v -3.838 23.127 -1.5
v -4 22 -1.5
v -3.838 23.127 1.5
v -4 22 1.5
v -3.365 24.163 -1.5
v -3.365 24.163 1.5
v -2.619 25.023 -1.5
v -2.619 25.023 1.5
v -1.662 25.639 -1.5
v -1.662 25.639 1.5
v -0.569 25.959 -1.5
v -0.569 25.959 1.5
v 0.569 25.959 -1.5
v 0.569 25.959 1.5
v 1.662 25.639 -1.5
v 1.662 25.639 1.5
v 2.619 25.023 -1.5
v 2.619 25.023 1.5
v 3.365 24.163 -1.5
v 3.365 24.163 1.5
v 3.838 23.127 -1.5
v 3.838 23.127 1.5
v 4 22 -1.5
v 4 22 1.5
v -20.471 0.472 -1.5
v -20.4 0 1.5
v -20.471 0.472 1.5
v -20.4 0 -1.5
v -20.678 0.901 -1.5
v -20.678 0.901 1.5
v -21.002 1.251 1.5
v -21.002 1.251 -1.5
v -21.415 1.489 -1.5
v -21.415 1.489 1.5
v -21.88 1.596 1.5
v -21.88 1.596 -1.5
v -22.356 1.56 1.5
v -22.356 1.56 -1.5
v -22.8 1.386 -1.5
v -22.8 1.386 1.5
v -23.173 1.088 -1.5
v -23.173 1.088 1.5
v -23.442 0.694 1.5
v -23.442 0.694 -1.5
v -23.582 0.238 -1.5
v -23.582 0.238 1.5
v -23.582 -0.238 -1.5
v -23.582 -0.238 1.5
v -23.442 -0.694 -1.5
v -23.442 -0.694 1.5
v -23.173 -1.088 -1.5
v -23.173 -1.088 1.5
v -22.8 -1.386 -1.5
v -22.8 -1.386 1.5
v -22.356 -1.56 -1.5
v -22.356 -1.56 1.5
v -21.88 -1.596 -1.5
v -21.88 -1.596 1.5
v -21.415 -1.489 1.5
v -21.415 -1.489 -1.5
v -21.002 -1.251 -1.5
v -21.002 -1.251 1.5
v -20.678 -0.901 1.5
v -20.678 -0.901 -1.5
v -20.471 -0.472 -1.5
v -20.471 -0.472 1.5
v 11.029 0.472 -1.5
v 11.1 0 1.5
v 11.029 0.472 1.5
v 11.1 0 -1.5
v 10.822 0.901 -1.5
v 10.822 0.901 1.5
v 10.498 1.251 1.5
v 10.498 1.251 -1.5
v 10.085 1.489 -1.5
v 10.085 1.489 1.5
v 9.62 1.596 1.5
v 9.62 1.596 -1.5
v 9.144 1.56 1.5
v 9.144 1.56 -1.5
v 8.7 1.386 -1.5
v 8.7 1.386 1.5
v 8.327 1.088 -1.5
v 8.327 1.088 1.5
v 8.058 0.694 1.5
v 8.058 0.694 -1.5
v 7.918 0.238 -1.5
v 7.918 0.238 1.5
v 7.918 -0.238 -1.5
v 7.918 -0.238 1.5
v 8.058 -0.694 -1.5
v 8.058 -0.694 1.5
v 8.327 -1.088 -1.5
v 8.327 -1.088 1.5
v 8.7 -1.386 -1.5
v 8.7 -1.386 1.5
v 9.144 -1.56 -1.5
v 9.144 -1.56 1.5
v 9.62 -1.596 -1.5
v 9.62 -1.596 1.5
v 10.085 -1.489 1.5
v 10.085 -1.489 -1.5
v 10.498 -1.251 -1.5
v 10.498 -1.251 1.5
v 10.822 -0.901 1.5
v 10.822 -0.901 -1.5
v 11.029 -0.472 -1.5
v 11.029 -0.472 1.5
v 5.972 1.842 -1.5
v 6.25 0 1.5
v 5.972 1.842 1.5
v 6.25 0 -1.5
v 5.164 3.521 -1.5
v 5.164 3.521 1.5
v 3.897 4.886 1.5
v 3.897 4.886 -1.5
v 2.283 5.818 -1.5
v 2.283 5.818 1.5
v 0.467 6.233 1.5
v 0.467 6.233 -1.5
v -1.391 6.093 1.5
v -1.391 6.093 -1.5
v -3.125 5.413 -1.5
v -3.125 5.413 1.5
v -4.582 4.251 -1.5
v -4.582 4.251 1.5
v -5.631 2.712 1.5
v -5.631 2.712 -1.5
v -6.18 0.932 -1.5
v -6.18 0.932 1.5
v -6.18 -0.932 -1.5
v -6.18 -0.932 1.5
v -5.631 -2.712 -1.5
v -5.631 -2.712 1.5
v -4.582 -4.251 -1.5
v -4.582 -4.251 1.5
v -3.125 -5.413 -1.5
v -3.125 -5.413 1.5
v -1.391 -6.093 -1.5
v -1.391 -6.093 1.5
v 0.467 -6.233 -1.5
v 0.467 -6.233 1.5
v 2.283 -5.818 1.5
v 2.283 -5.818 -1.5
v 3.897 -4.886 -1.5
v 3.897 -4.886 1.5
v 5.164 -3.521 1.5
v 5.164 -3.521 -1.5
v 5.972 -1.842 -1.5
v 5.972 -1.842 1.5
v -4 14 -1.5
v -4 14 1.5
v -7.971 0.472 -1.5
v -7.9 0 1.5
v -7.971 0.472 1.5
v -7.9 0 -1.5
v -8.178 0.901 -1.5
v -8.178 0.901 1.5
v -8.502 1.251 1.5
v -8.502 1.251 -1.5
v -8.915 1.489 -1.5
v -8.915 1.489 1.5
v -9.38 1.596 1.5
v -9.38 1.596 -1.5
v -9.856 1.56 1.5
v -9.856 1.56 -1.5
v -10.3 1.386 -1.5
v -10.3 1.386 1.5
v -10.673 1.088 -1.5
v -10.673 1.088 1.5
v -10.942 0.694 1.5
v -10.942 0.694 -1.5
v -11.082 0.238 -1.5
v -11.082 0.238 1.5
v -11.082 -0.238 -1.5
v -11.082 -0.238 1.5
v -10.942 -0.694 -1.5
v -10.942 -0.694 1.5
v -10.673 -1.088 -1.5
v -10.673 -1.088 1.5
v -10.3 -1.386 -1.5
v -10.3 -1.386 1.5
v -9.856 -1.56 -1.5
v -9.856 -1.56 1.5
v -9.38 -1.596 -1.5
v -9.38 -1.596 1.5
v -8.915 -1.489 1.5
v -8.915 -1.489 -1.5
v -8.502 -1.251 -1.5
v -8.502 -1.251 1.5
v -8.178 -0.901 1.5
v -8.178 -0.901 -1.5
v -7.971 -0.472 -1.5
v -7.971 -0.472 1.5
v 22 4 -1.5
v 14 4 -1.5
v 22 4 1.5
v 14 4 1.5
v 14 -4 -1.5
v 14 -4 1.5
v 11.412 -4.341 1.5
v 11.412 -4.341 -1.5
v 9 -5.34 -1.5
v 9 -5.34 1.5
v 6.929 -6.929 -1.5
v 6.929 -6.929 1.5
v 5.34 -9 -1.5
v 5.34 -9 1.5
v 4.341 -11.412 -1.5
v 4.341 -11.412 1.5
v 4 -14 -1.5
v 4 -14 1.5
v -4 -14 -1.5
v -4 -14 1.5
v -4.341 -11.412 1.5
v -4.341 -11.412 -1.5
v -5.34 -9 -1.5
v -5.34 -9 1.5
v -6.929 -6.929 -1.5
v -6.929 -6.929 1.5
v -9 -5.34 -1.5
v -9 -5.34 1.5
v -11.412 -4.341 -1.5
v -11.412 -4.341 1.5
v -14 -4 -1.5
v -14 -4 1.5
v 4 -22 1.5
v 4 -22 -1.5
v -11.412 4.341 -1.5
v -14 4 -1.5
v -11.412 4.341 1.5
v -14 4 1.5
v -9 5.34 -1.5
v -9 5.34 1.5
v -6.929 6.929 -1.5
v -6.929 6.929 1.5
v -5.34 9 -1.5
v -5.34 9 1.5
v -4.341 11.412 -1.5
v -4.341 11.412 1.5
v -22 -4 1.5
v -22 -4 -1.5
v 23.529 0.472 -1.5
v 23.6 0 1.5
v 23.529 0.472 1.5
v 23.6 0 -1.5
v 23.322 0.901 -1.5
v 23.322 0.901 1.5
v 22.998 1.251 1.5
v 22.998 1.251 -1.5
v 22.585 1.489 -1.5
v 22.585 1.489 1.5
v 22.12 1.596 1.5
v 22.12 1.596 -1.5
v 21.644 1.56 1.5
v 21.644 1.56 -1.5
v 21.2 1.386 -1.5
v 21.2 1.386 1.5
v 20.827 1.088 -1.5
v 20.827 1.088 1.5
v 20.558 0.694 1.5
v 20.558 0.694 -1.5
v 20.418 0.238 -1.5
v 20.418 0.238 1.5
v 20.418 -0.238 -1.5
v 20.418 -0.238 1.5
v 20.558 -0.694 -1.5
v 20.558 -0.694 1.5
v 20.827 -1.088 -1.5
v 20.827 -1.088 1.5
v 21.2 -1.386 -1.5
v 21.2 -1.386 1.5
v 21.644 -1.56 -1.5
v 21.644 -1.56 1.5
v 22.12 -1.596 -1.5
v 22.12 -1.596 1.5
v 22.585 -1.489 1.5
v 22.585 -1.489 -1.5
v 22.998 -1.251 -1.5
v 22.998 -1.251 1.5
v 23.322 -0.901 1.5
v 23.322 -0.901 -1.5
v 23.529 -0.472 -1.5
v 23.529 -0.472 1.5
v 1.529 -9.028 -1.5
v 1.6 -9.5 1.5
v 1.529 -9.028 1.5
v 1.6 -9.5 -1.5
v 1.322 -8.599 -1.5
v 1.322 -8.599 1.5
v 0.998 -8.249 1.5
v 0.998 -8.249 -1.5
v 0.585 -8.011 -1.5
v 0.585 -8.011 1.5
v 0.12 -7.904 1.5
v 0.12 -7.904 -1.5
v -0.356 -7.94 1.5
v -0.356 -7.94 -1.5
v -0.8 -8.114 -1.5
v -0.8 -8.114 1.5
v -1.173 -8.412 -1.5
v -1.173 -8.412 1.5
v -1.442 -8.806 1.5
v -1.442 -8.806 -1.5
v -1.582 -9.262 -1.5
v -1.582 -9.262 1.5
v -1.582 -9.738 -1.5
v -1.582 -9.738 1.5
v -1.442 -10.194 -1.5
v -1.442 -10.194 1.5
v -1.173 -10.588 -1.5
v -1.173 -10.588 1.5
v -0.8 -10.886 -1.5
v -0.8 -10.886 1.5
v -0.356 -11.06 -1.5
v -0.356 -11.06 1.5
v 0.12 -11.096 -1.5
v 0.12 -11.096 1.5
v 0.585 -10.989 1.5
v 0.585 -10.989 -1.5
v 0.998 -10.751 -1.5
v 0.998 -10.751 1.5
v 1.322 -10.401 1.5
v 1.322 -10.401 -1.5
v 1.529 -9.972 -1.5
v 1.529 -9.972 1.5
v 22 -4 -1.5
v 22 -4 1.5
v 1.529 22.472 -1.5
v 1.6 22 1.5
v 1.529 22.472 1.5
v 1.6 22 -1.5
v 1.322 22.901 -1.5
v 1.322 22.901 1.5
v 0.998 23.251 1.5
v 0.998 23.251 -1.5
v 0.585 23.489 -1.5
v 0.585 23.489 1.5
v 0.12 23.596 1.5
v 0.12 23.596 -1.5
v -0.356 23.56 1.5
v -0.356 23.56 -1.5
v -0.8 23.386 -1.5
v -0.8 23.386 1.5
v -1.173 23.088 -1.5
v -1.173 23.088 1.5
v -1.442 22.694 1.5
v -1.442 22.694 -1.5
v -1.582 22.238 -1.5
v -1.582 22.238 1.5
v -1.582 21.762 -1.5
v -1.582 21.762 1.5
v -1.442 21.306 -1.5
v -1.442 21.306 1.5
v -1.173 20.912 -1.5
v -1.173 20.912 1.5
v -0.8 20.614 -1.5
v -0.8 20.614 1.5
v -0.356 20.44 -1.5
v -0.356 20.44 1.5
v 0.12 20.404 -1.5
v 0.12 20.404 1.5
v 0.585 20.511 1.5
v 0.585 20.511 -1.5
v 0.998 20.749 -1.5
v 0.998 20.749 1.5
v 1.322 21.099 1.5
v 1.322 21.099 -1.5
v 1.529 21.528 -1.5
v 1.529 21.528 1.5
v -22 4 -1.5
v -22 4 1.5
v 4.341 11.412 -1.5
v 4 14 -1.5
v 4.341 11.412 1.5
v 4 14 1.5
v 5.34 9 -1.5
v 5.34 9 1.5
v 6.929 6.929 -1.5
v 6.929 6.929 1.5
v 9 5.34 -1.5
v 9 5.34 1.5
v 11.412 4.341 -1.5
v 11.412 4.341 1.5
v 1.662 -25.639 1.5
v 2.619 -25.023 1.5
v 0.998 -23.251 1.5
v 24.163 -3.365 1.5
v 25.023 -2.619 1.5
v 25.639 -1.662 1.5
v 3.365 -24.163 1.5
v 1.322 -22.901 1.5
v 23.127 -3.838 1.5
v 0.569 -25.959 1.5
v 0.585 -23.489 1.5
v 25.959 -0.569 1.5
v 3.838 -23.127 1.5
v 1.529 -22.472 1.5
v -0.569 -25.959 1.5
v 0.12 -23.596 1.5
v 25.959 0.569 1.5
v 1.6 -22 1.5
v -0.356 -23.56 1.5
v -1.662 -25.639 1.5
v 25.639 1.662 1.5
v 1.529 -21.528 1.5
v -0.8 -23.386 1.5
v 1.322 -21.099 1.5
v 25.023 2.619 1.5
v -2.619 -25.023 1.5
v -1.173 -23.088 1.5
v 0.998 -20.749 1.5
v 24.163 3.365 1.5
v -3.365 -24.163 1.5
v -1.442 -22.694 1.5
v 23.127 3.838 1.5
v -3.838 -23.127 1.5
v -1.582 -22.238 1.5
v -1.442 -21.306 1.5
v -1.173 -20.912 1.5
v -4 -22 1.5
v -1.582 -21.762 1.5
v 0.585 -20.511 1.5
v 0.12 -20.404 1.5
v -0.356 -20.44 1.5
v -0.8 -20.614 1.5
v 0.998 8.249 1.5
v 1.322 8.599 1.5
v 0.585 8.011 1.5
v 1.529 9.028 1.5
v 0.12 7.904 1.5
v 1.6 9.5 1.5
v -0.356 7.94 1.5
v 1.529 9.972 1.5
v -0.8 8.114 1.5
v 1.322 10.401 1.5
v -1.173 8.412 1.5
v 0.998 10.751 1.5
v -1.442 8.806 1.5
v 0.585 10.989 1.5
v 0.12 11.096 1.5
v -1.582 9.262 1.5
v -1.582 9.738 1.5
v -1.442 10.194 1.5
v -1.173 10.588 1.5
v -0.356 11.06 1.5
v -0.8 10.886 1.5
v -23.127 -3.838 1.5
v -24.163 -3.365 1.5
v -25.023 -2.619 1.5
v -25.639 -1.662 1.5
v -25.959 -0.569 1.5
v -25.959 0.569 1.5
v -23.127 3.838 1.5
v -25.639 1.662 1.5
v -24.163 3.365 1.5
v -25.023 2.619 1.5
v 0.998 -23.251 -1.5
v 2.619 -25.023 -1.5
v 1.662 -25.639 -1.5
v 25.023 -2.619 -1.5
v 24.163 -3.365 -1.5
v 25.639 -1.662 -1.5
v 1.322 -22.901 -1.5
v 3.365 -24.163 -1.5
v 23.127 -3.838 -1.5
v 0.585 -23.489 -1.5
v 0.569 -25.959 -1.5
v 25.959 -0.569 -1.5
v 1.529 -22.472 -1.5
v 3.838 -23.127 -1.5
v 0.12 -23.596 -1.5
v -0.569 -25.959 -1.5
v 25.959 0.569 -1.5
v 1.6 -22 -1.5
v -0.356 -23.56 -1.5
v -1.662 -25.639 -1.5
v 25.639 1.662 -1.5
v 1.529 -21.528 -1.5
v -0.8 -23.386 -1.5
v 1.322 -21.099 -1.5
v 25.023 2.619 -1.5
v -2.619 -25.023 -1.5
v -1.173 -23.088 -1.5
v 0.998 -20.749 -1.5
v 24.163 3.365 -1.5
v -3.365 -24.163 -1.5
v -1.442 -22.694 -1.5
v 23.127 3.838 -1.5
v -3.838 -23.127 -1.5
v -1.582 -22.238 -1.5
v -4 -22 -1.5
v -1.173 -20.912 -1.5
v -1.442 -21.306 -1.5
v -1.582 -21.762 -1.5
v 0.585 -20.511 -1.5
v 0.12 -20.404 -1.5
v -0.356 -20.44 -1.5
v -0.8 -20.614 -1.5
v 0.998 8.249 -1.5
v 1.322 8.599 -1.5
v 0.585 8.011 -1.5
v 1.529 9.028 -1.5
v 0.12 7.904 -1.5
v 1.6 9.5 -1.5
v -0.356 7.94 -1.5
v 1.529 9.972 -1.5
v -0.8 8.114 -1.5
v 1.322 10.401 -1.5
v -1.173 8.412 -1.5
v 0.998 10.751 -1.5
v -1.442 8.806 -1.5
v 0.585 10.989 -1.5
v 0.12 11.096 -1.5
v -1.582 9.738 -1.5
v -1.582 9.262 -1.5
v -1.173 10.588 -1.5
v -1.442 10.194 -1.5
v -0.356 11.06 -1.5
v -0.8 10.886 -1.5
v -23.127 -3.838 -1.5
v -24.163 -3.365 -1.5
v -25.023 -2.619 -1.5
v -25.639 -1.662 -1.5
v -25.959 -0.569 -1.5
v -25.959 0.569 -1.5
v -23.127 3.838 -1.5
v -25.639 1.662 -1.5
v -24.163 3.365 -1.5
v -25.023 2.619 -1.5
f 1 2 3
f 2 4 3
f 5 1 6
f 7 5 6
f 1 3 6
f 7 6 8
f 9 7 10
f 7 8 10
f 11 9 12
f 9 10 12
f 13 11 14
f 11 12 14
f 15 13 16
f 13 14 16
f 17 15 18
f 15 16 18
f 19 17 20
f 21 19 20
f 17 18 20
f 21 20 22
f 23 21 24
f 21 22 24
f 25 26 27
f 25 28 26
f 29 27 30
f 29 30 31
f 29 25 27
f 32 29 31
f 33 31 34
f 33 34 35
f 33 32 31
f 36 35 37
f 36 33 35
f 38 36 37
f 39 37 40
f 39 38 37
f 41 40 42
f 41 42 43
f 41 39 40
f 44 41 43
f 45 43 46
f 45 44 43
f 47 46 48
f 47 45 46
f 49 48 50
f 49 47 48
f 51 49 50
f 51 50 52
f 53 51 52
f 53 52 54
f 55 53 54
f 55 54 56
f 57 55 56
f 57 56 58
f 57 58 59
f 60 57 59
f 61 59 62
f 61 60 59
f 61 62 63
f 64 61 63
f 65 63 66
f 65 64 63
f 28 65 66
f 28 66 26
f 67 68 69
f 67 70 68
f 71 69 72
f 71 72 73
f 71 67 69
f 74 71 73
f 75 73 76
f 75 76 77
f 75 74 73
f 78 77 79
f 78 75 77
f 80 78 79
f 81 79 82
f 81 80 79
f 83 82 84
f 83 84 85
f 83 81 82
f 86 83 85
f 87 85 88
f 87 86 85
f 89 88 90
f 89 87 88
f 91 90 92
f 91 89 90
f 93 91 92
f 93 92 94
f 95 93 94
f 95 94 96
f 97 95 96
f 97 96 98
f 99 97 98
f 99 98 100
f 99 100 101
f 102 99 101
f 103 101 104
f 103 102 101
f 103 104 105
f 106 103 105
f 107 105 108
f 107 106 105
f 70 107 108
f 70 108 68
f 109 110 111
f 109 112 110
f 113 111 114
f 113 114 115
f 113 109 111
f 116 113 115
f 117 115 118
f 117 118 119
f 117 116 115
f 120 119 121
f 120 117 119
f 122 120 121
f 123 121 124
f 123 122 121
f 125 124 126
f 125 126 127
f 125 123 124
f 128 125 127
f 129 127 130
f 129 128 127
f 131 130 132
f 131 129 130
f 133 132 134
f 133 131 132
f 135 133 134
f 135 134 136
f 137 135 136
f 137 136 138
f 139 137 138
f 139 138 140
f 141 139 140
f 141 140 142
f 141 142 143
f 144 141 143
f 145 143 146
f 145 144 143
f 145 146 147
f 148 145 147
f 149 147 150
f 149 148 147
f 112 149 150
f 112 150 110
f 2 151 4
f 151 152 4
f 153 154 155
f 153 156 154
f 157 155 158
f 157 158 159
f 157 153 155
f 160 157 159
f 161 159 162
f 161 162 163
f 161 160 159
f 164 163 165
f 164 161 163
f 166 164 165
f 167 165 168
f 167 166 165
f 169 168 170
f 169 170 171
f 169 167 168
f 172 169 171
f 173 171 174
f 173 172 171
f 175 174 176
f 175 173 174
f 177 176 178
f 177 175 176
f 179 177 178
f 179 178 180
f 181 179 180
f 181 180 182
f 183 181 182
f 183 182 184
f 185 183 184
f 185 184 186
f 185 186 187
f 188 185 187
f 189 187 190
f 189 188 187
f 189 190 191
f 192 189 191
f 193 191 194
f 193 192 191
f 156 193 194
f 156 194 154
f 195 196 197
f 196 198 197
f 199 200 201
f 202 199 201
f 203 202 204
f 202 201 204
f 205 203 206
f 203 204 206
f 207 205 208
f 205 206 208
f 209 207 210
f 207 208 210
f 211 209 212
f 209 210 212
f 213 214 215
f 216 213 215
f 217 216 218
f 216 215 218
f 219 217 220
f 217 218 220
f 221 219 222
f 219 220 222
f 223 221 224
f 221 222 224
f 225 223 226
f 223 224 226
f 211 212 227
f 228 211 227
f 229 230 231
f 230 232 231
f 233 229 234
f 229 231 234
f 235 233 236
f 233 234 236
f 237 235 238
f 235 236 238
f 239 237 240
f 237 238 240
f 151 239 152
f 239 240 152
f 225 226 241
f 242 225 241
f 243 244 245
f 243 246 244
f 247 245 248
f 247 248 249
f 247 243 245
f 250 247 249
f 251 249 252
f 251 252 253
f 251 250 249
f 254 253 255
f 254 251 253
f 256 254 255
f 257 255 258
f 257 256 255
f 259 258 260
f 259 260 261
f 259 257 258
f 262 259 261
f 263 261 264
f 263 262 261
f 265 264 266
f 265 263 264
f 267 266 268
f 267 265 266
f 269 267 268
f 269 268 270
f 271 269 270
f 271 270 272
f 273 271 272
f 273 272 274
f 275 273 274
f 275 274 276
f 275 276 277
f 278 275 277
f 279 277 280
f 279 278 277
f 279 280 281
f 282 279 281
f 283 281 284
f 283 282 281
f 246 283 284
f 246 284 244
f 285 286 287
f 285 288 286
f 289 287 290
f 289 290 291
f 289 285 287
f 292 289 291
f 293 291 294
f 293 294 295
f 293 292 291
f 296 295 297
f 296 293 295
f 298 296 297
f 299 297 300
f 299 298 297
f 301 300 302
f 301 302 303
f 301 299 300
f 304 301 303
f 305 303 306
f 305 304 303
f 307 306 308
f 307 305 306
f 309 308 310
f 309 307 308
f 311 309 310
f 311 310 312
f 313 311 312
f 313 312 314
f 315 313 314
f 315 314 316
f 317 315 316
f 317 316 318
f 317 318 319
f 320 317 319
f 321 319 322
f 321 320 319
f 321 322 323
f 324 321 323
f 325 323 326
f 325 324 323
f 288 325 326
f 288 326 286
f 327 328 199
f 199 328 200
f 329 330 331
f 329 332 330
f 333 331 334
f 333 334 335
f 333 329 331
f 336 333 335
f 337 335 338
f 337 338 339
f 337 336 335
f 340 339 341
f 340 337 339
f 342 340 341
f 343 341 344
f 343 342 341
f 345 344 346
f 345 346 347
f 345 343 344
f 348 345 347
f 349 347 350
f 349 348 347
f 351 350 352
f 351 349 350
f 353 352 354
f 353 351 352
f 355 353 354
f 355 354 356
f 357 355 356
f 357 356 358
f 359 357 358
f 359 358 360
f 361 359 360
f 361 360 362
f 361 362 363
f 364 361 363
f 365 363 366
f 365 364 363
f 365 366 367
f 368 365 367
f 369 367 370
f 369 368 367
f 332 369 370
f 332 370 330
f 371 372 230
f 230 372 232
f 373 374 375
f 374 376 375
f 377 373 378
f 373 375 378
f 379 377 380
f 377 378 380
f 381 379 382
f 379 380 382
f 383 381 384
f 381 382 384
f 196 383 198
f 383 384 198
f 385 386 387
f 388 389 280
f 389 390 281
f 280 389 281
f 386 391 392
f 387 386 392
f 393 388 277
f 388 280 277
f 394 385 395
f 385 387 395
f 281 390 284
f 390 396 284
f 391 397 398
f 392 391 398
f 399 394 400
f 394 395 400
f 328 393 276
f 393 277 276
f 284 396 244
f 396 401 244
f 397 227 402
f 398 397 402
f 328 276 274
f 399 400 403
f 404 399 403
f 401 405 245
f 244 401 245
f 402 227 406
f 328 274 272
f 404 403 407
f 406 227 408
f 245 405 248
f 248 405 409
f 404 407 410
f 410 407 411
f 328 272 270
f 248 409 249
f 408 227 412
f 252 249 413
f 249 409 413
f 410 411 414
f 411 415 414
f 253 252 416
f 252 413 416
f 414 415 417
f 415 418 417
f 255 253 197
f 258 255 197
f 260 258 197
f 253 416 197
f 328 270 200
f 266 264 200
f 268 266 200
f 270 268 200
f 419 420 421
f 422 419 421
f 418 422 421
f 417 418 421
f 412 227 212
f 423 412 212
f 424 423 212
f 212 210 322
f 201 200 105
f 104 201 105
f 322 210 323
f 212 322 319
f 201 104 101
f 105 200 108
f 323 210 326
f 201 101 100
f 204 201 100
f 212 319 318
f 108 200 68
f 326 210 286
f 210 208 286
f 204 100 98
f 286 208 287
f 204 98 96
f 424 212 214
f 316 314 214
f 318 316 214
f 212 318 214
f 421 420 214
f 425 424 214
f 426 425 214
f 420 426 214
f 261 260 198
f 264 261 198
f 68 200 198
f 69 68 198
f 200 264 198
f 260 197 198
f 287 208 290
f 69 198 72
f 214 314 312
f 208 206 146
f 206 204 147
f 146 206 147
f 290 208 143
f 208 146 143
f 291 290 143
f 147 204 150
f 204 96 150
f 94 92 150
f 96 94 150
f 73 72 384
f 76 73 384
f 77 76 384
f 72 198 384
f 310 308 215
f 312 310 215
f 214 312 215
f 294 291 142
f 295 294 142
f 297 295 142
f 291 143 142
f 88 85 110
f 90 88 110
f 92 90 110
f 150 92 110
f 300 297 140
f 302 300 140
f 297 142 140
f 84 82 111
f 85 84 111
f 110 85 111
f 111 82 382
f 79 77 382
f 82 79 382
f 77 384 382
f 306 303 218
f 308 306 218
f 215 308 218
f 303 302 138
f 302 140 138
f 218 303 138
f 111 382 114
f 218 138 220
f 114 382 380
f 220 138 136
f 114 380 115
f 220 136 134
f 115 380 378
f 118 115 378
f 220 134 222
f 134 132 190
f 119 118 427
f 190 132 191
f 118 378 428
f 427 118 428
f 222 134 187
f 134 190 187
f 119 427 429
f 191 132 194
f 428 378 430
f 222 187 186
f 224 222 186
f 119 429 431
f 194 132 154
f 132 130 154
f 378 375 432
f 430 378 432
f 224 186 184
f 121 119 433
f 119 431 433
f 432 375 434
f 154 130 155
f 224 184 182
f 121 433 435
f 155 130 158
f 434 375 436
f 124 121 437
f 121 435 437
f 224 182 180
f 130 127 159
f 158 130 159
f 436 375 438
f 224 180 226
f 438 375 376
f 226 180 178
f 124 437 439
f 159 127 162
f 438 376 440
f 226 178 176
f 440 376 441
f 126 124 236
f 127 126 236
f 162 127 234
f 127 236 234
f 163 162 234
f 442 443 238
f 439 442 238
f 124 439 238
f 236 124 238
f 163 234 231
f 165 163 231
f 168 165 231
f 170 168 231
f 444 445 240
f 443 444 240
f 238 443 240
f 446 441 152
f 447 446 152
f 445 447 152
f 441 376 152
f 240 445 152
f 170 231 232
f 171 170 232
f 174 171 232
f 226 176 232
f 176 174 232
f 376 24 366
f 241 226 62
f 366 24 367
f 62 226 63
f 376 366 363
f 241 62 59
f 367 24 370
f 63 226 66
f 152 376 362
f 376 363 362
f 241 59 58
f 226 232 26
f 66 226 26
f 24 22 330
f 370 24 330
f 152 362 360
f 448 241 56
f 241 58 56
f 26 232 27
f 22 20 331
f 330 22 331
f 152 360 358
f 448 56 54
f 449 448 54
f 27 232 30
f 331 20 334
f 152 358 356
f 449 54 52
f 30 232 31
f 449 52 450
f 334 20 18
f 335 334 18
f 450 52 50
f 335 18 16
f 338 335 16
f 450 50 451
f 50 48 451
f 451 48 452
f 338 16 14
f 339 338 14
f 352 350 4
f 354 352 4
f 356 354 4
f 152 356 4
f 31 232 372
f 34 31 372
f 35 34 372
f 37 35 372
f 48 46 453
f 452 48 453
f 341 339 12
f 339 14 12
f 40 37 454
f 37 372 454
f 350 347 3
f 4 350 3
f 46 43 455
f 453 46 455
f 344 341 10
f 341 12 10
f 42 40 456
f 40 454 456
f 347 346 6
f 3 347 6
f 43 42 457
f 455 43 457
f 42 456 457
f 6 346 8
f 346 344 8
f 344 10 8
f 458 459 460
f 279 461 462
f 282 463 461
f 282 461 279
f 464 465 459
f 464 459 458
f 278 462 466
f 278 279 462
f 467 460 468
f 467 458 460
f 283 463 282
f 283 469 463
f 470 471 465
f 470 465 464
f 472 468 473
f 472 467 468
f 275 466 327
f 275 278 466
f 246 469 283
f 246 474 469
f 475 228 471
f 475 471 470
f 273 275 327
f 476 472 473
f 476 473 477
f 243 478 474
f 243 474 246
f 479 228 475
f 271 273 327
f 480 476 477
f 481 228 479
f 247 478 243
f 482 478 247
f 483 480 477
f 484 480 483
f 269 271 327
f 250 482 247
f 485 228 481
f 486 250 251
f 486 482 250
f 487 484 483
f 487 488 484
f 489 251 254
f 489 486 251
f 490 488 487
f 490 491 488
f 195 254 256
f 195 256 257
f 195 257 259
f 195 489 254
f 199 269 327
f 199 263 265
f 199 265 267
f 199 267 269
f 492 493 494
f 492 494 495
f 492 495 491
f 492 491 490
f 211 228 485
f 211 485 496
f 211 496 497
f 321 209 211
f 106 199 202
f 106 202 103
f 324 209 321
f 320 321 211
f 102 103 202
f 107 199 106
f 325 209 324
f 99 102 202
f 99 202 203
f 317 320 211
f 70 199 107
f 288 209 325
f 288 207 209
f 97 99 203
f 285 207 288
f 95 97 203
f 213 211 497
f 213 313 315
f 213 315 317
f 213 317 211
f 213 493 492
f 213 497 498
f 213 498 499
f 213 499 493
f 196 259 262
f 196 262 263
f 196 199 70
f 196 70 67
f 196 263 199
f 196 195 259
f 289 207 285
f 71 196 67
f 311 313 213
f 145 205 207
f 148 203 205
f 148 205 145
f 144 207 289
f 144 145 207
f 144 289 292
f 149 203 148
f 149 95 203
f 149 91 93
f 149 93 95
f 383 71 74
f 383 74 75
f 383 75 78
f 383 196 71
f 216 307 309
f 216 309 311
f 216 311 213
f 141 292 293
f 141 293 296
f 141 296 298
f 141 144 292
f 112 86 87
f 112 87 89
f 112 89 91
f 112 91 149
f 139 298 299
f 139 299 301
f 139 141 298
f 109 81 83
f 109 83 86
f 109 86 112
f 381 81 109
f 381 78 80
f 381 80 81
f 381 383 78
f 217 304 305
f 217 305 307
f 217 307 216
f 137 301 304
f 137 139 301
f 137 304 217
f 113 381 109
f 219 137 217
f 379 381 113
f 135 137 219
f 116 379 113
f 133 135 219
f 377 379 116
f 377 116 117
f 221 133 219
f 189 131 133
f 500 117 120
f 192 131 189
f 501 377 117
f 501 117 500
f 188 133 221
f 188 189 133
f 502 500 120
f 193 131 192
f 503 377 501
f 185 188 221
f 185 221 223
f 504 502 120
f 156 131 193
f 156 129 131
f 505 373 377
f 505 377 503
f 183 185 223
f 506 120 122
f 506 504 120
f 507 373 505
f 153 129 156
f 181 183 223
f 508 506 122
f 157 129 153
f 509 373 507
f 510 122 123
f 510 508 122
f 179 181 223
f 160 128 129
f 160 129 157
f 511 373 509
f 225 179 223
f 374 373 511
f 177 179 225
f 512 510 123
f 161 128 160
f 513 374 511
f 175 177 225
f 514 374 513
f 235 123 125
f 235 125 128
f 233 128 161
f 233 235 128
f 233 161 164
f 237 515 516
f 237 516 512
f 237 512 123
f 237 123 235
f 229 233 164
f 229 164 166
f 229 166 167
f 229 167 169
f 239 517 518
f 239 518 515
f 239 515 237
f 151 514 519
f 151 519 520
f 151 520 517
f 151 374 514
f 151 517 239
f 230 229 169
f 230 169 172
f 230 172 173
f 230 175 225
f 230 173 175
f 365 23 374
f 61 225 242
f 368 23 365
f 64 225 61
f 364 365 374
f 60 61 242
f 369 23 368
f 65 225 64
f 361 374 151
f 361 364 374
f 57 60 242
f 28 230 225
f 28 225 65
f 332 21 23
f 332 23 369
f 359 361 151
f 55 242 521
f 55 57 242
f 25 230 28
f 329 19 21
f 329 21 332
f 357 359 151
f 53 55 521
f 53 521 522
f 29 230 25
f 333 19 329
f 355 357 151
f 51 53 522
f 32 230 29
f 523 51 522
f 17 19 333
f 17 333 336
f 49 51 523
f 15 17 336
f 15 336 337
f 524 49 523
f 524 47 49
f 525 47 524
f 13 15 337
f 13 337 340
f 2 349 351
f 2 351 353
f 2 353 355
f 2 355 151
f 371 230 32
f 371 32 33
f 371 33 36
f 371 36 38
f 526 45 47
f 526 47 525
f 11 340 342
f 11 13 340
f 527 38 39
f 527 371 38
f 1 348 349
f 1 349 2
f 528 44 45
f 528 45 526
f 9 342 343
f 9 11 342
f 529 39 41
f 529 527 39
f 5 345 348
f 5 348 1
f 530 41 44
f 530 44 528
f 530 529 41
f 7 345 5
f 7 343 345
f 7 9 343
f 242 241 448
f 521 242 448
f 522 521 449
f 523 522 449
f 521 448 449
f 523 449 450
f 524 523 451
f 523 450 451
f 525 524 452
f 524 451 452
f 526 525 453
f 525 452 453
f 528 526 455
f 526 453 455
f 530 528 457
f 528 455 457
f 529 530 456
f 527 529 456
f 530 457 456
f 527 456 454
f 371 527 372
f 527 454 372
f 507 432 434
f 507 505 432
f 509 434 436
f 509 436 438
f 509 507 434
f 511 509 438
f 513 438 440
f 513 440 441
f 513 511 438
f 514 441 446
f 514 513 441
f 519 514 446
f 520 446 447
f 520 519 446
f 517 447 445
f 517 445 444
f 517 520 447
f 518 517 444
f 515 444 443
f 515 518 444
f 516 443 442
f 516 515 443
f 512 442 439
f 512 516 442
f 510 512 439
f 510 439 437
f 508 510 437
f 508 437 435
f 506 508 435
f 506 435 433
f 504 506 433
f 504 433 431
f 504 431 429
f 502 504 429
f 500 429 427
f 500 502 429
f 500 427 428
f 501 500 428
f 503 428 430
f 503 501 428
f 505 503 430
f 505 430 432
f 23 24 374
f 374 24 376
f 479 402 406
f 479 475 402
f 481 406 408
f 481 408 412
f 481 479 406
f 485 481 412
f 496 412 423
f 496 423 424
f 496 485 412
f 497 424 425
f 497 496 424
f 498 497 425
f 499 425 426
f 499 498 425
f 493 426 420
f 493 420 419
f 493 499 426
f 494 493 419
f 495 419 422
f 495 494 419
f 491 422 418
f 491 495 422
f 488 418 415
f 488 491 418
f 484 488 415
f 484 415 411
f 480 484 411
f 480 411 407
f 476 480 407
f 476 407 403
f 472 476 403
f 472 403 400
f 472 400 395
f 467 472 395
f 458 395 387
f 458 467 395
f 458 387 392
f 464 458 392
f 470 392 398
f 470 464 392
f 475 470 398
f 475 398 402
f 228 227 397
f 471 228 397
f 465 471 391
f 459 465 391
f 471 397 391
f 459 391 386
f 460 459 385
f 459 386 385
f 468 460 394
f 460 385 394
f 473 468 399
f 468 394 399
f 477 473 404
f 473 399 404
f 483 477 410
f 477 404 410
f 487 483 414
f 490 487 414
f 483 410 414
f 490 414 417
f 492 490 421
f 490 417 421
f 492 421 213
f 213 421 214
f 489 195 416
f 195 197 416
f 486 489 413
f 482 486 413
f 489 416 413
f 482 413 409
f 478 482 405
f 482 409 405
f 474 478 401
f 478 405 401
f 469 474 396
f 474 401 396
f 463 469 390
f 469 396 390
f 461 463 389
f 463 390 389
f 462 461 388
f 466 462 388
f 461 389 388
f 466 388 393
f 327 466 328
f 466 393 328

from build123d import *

# Parameters (mm, degrees)
SKETCH_1_R      = 6.25
SKETCH_1_R_2    = 1.6
EXTRUDE_1_DEPTH = 1.5


with BuildPart() as part:
    # Эскиз1 → Бобышка-Вытянуть1 (new body, symmetric)
    with BuildSketch(Plane.XY):
        with BuildLine():
            Line((-22, 4), (-14, 4))
            ThreePointArc((-14, 4), (-6.928932188, 6.928932188), (-4, 14))
            Line((-4, 14), (-4, 22))
            ThreePointArc((-4, 22), (0, 26), (4, 22))
            Line((4, 22), (4, 14))
            ThreePointArc((4, 14), (6.928932188, 6.928932188), (14, 4))
            Line((14, 4), (22, 4))
            ThreePointArc((22, 4), (26, 0), (22, -4))
            Line((22, -4), (14, -4))
            ThreePointArc((14, -4), (6.928932188, -6.928932188), (4, -14))
            Line((4, -14), (4, -22))
            ThreePointArc((4, -22), (0, -26), (-4, -22))
            Line((-4, -22), (-4, -14))
            ThreePointArc((-4, -14), (-6.928932188, -6.928932188), (-14, -4))
            Line((-14, -4), (-22, -4))
            ThreePointArc((-22, -4), (-26, 0), (-22, 4))
        make_face()
        Circle(SKETCH_1_R, mode=Mode.SUBTRACT)
        with Locations((-9.5, 0)):
            Circle(SKETCH_1_R_2, mode=Mode.SUBTRACT)
        with Locations((-22, 0)):
            Circle(SKETCH_1_R_2, mode=Mode.SUBTRACT)
        with Locations((0, 9.5)):
            Circle(SKETCH_1_R_2, mode=Mode.SUBTRACT)
        with Locations((0, 22)):
            Circle(SKETCH_1_R_2, mode=Mode.SUBTRACT)
        with Locations((9.5, 0)):
            Circle(SKETCH_1_R_2, mode=Mode.SUBTRACT)
        with Locations((22, 0)):
            Circle(SKETCH_1_R_2, mode=Mode.SUBTRACT)
        with Locations((0, -22)):
            Circle(SKETCH_1_R_2, mode=Mode.SUBTRACT)
        with Locations((0, -9.5)):
            Circle(SKETCH_1_R_2, mode=Mode.SUBTRACT)
    extrude(amount=EXTRUDE_1_DEPTH, both=True)


solid = part.part
